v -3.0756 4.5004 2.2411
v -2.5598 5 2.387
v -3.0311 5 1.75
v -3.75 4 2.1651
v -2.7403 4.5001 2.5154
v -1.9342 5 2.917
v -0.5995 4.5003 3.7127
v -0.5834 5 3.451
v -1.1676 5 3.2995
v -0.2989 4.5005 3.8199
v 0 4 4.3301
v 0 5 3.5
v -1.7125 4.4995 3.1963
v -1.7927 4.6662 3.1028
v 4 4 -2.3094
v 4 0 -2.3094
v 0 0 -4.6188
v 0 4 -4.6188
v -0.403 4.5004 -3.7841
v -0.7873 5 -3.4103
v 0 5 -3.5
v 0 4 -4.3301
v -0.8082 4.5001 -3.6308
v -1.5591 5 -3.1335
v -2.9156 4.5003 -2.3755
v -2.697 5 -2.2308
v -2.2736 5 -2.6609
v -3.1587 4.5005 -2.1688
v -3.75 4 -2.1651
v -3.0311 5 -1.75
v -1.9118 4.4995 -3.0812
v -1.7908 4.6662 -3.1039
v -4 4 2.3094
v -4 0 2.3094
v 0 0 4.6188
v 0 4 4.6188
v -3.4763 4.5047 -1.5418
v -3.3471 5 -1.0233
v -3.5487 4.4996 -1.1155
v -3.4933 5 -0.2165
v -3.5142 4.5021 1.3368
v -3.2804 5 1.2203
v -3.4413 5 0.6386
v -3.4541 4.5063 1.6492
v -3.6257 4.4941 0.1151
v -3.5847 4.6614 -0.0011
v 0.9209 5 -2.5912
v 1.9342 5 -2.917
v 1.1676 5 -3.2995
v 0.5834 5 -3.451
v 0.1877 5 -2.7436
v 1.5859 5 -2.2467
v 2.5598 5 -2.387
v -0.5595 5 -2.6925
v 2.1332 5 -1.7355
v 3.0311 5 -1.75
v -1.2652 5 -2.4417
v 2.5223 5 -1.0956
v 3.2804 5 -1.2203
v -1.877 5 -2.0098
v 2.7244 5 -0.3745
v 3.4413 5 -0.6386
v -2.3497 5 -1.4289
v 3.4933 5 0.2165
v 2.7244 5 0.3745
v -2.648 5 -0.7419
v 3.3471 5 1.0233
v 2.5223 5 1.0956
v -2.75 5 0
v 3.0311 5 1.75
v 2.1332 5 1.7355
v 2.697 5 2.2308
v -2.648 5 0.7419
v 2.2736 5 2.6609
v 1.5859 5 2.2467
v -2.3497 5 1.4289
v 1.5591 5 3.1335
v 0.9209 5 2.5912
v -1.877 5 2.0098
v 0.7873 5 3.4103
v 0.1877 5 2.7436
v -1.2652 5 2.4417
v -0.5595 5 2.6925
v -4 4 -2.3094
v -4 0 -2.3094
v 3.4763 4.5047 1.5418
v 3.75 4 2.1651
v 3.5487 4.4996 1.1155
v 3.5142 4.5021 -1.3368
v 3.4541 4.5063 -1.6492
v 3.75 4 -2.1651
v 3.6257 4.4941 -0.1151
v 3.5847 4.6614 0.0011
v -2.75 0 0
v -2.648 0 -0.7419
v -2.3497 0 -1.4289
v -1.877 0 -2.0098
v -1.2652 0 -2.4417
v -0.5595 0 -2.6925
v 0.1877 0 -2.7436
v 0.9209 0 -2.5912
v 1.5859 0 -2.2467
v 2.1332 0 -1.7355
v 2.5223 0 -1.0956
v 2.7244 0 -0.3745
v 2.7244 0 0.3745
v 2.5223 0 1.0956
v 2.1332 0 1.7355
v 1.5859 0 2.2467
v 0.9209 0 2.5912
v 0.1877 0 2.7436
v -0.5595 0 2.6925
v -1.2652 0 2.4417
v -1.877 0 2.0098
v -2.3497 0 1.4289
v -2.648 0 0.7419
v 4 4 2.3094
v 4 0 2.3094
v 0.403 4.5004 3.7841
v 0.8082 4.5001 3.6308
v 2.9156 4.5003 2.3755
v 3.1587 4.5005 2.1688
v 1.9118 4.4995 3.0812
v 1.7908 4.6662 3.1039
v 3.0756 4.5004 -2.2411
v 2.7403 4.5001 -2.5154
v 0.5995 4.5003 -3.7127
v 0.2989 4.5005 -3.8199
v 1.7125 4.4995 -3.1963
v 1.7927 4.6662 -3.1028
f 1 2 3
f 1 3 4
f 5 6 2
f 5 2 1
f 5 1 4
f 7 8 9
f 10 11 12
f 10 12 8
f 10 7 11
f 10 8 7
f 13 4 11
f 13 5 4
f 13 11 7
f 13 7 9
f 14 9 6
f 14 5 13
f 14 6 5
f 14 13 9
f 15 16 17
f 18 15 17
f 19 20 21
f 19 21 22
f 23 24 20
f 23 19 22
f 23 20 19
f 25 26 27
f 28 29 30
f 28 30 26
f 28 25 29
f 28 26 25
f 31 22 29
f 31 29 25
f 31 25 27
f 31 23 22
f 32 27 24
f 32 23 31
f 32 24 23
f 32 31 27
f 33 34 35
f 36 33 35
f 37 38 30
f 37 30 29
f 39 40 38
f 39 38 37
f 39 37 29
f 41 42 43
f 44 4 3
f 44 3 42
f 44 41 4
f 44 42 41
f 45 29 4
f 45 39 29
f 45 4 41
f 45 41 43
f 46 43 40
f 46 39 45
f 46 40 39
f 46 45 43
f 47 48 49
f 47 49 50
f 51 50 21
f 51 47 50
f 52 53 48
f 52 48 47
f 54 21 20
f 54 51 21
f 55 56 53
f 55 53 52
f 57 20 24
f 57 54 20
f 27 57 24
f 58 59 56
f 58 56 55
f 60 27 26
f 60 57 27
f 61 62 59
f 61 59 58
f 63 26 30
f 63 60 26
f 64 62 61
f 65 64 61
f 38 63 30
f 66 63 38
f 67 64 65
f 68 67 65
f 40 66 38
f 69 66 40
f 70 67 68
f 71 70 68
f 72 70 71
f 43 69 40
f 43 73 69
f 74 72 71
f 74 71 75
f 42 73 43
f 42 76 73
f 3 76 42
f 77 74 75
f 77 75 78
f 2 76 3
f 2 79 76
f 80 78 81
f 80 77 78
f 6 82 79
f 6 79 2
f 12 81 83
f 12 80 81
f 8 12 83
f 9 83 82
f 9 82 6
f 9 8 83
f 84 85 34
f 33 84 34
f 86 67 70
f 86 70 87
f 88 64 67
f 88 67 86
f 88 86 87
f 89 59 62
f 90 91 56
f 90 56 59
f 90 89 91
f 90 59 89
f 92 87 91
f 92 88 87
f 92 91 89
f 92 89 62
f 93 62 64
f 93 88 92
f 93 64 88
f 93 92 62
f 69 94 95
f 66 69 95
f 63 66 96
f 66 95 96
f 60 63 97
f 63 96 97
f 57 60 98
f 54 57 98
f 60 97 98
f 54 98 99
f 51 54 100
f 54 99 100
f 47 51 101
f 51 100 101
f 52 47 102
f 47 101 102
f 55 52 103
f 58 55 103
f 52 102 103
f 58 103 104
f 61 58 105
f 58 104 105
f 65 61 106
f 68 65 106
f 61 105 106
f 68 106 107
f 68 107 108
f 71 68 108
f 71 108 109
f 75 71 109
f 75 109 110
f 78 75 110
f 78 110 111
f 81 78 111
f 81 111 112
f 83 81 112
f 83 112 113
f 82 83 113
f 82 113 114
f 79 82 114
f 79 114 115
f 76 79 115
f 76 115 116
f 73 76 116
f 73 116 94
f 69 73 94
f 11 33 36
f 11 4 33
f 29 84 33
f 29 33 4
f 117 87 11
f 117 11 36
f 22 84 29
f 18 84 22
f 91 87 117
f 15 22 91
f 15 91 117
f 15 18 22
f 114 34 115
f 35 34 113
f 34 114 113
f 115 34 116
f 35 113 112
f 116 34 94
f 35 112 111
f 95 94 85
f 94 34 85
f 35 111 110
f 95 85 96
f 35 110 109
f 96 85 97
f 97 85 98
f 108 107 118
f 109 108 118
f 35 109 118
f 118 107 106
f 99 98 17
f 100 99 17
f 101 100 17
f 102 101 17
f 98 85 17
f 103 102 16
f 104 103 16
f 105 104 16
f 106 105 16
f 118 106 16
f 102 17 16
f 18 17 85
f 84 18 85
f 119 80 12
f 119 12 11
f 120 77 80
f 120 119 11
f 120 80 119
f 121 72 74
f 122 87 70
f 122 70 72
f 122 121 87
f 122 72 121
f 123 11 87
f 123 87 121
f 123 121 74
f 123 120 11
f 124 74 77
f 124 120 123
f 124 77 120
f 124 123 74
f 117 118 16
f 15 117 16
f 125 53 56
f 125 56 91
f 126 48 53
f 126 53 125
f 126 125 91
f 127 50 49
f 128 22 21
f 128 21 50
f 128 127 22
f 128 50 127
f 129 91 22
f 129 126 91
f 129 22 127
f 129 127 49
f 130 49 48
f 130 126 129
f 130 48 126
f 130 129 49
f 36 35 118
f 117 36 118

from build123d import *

# Parameters (mm, degrees)
BODY_DEPTH           = 4
M5_CLEARANCE_HOLE2_D = 5.5


with BuildPart() as part:
    # Sketch1 → Body (new body)
    with BuildSketch(Plane(origin=(0, 0, 0), x_dir=(1, 0, 0), z_dir=(0, 1, 0))):
        Polygon((0, 4.618802154), (-4, 2.309401077), (-4, -2.309401077), (0, -4.618802154), (4, -2.309401077), (4, 2.309401077), align=None)
    extrude(amount=BODY_DEPTH)

    # Sketch5 → Loft1 section 0
    with BuildSketch(Plane(origin=(0, 4, 0), x_dir=(1, 0, 0), z_dir=(0, 1, 0))):
        with BuildLine():
            Line((3.75, 2.165063509), (0, 4.330127019))
            Line((0, 4.330127019), (-3.75, 2.165063509))
            Line((-3.75, 2.165063509), (-3.75, -2.165063509))
            Line((-3.75, -2.165063509), (0, -4.330127019))
            Line((0, -4.330127019), (3.75, -2.165063509))
            Line((3.75, -2.165063509), (3.75, 2.165063509))
        make_face()
    # Sketch4 for Loft1 → Loft1 section 1
    with BuildSketch(Plane(origin=(0, 5, 0), x_dir=(1, 0, 0), z_dir=(0, 1, 0))):
        with BuildLine():
            # circular arc as an exact rational Bezier (weights 1, cos(half-angle), 1)
            Bezier((3.031088913, 1.75), (2.020725942, 3.5), (0, 3.5), weights=[1, 0.866025404, 1])
            Bezier((0, 3.5), (-2.020725942, 3.5), (-3.031088913, 1.75), weights=[1, 0.866025404, 1])
            Bezier((-3.031088913, 1.75), (-4.041451885, 0), (-3.031088913, -1.75), weights=[1, 0.866025404, 1])
            Bezier((-3.031088913, -1.75), (-2.020725942, -3.5), (0, -3.5), weights=[1, 0.866025404, 1])
            Bezier((0, -3.5), (2.020725942, -3.5), (3.031088913, -1.75), weights=[1, 0.866025404, 1])
            Bezier((3.031088913, -1.75), (4.041451885, 0), (3.031088913, 1.75), weights=[1, 0.866025404, 1])
        make_face()
    loft()

    # M5 Clearance Hole2 (through all)
    with Locations(Plane(origin=(0, 5, 0), x_dir=(1, 0, 0), z_dir=(0, 1, 0))):
        with Locations((0, 0)):
            Hole(M5_CLEARANCE_HOLE2_D / 2)


solid = part.part
